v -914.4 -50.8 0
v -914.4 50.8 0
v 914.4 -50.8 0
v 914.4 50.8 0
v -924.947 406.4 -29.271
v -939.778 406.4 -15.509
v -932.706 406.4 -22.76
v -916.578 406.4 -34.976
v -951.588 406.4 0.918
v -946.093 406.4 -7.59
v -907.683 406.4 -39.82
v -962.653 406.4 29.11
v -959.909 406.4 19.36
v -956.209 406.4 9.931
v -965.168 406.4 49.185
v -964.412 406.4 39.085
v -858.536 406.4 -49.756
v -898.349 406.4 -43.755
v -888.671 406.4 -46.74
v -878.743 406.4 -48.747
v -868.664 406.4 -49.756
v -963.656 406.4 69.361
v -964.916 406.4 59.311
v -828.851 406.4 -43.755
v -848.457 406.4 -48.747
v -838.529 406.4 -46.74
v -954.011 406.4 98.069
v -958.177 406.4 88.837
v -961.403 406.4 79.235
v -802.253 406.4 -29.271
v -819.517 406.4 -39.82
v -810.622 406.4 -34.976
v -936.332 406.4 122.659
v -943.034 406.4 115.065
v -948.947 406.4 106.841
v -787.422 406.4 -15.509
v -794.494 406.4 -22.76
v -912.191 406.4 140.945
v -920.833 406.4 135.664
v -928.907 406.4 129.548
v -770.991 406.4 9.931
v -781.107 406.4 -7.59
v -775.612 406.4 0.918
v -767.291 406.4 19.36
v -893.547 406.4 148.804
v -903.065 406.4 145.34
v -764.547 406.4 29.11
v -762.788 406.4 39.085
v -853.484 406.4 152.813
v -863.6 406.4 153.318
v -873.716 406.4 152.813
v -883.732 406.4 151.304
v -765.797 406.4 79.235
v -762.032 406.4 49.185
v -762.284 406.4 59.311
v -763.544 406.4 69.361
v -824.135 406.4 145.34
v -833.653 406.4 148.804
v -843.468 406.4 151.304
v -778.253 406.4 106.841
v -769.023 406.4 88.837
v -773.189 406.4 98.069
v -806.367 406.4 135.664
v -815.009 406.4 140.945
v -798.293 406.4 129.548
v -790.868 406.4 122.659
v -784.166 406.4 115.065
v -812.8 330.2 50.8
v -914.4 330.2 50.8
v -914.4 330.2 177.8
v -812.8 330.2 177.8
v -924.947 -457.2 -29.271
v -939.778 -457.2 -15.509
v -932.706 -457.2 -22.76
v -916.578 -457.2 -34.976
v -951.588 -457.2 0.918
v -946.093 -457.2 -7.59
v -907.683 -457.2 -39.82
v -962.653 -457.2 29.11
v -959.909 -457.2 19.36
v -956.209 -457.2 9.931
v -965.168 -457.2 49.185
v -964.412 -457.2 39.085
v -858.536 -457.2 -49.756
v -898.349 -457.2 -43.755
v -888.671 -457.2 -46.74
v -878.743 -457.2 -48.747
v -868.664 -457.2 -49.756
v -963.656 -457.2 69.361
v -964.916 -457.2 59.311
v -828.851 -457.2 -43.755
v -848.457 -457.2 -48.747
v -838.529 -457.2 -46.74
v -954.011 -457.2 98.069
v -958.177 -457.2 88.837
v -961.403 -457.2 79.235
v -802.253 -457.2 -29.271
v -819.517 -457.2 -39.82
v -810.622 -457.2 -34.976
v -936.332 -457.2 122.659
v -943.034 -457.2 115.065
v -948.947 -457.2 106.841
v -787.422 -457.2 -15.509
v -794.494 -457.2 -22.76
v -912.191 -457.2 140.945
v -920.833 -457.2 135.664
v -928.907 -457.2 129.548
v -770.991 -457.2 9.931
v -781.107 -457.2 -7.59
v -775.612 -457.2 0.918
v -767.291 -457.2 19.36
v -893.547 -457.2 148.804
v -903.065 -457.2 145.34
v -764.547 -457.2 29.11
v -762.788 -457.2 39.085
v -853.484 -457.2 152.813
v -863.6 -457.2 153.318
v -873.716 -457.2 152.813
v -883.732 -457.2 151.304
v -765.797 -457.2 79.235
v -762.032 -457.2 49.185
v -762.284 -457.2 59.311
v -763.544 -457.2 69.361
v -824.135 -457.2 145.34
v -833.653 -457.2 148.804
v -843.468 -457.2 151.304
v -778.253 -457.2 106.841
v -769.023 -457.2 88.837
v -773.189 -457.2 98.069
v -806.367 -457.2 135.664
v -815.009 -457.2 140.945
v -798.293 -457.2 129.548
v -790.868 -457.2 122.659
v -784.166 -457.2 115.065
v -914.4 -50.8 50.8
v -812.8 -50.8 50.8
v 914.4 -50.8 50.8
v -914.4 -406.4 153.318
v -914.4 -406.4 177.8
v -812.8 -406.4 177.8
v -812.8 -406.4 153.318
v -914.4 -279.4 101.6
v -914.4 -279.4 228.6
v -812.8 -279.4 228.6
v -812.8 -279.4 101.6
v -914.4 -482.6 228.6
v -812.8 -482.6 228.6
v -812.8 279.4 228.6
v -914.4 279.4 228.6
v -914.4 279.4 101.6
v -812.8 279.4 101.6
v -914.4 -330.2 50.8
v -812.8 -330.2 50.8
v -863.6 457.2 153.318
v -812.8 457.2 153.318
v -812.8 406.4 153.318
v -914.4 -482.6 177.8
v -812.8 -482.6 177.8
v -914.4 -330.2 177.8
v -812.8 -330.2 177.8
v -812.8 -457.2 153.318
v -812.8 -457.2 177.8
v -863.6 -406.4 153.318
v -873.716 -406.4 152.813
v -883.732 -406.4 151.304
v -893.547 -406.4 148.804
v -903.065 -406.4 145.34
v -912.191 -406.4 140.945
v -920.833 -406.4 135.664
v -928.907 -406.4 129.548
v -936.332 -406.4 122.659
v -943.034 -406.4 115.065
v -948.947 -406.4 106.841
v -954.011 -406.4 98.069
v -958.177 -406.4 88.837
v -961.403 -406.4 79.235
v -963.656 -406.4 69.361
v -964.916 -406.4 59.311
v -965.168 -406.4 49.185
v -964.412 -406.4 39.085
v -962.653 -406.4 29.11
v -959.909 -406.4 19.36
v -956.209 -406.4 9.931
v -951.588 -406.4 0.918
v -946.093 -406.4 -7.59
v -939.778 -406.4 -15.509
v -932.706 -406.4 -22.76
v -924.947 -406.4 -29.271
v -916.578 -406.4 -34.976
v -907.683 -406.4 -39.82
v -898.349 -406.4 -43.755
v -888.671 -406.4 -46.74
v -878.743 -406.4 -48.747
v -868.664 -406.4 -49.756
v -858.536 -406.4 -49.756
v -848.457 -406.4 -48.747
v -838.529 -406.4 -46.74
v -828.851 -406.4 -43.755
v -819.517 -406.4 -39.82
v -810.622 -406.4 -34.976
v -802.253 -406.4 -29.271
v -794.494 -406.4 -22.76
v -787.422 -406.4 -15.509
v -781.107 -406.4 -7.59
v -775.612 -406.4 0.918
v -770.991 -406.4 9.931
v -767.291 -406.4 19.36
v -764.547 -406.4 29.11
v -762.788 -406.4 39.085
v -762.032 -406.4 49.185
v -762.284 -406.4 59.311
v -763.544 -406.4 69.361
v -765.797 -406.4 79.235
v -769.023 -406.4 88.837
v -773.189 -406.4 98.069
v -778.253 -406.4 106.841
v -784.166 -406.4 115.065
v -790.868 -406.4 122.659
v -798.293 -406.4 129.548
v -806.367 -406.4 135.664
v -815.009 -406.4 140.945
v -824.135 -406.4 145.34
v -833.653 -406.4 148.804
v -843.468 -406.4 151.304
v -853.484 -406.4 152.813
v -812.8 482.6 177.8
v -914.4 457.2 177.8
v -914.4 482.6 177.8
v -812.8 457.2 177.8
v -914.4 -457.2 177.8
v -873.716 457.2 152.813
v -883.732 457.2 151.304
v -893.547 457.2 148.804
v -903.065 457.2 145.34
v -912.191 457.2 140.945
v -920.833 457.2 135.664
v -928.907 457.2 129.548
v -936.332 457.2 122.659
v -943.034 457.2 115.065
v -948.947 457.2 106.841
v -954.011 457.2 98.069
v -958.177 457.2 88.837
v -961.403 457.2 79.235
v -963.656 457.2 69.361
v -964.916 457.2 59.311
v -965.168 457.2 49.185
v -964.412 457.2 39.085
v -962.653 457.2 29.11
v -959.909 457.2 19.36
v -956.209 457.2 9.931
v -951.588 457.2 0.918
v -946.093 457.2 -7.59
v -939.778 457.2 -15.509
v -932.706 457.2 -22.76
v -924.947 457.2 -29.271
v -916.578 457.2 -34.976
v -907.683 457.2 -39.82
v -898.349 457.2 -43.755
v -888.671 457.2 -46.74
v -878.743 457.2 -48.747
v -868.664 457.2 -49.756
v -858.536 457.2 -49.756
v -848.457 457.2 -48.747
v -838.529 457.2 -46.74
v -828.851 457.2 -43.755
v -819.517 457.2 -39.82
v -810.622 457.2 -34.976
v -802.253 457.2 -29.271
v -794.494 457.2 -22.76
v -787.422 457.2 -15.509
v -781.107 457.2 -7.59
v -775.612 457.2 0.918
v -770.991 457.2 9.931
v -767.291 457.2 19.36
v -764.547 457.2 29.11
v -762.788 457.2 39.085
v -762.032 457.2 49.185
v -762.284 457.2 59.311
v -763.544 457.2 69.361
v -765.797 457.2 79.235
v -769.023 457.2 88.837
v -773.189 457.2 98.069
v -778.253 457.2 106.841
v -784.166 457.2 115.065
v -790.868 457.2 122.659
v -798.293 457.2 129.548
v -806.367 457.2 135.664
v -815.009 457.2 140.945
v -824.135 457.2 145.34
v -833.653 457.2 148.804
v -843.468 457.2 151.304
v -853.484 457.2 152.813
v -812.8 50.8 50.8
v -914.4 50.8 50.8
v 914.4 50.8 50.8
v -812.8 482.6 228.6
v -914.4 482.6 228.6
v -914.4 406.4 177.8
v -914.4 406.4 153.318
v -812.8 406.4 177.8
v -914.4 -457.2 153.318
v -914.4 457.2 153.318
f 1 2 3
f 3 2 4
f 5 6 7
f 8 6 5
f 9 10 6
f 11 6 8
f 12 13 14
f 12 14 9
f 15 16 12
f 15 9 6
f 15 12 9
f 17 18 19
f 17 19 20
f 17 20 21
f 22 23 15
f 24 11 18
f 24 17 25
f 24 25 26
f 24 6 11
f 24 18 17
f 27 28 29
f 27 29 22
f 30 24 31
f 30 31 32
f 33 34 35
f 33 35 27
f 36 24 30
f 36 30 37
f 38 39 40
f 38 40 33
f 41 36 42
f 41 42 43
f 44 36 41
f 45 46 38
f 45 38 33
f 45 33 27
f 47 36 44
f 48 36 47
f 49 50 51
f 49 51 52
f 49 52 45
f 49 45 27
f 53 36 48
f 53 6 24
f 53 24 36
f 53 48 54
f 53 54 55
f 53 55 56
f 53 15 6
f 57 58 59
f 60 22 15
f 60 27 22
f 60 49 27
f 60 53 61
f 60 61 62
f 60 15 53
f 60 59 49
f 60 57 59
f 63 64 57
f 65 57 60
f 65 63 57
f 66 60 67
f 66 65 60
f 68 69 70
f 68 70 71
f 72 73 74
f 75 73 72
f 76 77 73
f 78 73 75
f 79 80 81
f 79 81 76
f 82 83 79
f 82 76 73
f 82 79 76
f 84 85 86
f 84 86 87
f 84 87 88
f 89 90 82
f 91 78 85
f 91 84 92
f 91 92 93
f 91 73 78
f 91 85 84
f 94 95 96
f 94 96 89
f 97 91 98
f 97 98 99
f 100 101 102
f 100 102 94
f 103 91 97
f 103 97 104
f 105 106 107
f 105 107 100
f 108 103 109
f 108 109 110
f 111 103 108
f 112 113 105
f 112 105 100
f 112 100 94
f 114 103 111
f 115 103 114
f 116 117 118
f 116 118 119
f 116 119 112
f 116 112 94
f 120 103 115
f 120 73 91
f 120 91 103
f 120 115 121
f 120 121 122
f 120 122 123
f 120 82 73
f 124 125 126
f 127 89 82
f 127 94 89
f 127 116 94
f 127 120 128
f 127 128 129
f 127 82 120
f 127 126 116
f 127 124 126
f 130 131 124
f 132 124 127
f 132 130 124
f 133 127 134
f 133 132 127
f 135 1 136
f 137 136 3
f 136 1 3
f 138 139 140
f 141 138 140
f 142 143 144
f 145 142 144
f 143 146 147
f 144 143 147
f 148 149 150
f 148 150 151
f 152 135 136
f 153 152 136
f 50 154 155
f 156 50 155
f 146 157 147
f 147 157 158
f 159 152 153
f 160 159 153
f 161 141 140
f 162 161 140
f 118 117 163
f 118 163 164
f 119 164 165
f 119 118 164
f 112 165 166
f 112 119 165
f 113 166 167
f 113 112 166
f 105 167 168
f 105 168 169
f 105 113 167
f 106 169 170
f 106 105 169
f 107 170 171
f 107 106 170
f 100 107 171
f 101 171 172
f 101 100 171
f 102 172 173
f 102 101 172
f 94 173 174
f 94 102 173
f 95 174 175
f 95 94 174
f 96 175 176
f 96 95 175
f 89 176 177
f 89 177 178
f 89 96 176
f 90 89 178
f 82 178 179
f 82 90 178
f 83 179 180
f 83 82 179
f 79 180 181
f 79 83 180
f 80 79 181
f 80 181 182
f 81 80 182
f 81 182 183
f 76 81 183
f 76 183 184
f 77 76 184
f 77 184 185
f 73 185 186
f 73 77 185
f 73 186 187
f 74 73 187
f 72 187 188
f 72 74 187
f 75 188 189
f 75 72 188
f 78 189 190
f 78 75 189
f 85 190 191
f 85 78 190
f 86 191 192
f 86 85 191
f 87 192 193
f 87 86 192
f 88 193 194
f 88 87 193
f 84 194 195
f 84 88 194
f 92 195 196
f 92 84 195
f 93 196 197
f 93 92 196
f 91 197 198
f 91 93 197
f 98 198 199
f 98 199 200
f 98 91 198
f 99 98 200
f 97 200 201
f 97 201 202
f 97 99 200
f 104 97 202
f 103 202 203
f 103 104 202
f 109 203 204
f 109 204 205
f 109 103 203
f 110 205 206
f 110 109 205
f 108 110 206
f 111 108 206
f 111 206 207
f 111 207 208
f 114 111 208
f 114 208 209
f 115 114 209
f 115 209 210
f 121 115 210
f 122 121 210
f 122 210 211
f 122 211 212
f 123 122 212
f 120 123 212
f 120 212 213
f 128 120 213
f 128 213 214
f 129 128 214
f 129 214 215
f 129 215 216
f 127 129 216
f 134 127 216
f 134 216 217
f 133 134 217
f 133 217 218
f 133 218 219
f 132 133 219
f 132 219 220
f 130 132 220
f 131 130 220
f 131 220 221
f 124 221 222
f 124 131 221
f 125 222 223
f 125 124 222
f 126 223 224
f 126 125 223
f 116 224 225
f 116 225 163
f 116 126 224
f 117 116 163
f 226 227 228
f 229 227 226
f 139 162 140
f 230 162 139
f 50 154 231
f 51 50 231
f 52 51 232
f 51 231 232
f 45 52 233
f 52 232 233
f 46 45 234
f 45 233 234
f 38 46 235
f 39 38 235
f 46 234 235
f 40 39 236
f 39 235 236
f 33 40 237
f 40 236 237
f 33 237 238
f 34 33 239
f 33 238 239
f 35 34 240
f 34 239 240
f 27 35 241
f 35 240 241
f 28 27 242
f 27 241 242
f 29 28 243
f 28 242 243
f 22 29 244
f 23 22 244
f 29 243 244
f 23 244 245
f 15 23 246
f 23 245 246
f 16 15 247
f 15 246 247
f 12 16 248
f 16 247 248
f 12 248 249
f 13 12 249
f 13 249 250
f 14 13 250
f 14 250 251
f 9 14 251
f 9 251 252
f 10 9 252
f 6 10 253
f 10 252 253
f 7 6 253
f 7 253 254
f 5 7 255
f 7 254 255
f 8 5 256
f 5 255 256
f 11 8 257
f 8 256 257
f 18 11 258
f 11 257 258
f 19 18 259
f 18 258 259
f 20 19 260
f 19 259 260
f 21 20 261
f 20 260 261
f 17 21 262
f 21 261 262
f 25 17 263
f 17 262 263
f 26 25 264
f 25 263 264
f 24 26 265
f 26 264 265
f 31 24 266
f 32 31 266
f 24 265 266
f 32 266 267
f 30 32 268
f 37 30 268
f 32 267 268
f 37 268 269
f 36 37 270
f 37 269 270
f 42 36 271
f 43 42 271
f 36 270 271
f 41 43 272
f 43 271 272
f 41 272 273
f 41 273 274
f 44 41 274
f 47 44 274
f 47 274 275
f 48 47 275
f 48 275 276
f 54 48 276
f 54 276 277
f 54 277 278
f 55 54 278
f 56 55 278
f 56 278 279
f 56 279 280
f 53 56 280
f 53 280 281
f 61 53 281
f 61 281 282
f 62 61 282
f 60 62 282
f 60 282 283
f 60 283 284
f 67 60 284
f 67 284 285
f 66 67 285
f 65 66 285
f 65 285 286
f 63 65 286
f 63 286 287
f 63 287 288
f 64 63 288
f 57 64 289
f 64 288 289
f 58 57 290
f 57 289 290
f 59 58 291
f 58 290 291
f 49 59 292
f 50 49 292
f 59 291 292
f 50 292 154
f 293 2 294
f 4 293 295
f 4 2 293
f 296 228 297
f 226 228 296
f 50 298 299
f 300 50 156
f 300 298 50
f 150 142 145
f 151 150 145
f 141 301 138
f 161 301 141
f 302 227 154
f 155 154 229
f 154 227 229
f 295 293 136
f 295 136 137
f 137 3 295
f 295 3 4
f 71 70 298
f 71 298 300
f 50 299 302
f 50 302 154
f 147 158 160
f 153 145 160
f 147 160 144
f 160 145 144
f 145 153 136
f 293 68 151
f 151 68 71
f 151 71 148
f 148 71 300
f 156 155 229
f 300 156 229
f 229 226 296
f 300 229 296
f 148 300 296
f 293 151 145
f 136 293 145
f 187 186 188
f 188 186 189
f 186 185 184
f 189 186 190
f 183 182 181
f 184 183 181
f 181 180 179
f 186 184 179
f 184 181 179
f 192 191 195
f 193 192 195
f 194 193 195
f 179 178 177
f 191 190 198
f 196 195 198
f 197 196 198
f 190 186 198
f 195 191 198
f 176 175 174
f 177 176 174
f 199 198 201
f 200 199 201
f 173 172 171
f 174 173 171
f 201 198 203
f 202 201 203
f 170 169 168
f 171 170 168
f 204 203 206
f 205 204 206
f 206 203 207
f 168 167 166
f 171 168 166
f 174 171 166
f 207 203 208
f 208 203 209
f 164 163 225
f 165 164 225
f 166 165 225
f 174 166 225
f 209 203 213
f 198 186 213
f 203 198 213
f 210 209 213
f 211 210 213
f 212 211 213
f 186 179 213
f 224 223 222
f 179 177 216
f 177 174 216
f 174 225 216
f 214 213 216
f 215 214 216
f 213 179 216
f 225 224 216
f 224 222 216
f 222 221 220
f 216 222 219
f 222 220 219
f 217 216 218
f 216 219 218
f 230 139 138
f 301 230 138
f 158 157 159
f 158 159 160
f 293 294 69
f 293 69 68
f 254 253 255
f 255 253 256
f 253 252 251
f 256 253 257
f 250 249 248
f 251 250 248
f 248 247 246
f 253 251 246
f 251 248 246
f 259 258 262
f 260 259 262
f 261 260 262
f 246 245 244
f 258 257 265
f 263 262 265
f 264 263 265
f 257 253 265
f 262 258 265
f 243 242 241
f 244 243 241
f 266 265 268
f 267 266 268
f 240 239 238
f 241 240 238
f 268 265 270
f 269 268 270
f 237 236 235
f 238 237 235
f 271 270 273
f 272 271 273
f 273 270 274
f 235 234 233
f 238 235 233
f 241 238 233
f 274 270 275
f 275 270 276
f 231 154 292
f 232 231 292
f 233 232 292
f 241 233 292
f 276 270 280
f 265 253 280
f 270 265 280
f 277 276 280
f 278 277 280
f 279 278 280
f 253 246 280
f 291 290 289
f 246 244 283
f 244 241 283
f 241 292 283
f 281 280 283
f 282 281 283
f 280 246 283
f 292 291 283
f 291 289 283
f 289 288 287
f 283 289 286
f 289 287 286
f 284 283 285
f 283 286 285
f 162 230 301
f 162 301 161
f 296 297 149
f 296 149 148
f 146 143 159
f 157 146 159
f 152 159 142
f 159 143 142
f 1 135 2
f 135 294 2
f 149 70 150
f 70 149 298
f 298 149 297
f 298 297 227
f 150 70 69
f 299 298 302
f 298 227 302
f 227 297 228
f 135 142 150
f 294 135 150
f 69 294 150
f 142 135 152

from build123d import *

# Parameters (mm, degrees)
F0_W      = 1828.8
F0_H      = 101.6
F1_DEPTH  = 50.8
F2_W      = 101.6
F2_H      = 177.8
F2_H_2    = 101.6
F2_H_3    = 228.6
F3_DEPTH  = 50.8
F4_W      = 101.6
F4_H      = 76.2
F4_H_2    = 50.8
F5_DEPTH  = 50.8
F6_W      = 101.6
F6_H      = 152.4
F6_H_2    = 50.8
F7_DEPTH  = 50.8
F10_DEPTH = 50.8


with BuildPart() as f1:
    # F0 (on Top) → F1 (new body)
    with BuildSketch(Plane.XY):
        Rectangle(F0_W, F0_H)
    extrude(amount=F1_DEPTH)

    # F2 (on face) → F3 (join)
    with BuildSketch(Plane.XY.offset(50.8)):
        with Locations((-863.6, 139.7)):
            Rectangle(F2_W, F2_H)
        with Locations((-863.6, 0)):
            Rectangle(F2_W, F2_H_2)
        with Locations((-863.6, -165.1)):
            Rectangle(F2_W, F2_H_3)
    extrude(amount=F3_DEPTH)

    # F4 (on face) → F5 (join)
    with BuildSketch(Plane.XZ.offset(279.4)):
        with Locations((-863.6, 139.7)):
            Rectangle(F4_W, F4_H)
        with Locations((-863.6, 76.2)):
            Rectangle(F4_W, F4_H_2)
    extrude(amount=F5_DEPTH)

    # F6 (on face) → F7 (join)
    with BuildSketch(Plane.XY.offset(177.8)):
        with Locations((-863.6, -406.4)):
            Rectangle(F6_W, F6_H)
        with Locations((-863.6, -304.8)):
            Rectangle(F6_W, F6_H_2)
    extrude(amount=F7_DEPTH)

    # F11: F1, F10, F10b across plane


with BuildPart() as f10:
    # F9 (on offset) → F10 (new body)
    with BuildSketch(Plane.XZ.offset(457.2)):
        with BuildLine():
            ThreePointArc((-762, 51.7180485362), (-791.7579510314, 123.5600975047), (-863.6, 153.3180485362))
            ThreePointArc((-863.6, 153.3180485362), (-935.4420489686, -20.1240004324), (-762, 51.7180485362))
        make_face()
    extrude(amount=-F10_DEPTH)


with BuildPart() as f10b:
    # F9 (on offset) → F10, piece 2 (new body)
    with BuildSketch(Plane.XZ.offset(457.2)):
        Polygon((-812.8, 177.8), (-914.4, 177.8), (-914.4, 153.3180485362), (-863.6, 153.3180485362), (-812.8, 153.3180485362), align=None)
    extrude(amount=-F10_DEPTH)


with BuildPart() as f1_1:
    add(f1.part)
    add(f1.part.mirror(Plane.XZ))
    add(f10.part.mirror(Plane.XZ))
    add(f10b.part.mirror(Plane.XZ))


solid = Compound([f10.part, f10b.part, f1_1.part])
